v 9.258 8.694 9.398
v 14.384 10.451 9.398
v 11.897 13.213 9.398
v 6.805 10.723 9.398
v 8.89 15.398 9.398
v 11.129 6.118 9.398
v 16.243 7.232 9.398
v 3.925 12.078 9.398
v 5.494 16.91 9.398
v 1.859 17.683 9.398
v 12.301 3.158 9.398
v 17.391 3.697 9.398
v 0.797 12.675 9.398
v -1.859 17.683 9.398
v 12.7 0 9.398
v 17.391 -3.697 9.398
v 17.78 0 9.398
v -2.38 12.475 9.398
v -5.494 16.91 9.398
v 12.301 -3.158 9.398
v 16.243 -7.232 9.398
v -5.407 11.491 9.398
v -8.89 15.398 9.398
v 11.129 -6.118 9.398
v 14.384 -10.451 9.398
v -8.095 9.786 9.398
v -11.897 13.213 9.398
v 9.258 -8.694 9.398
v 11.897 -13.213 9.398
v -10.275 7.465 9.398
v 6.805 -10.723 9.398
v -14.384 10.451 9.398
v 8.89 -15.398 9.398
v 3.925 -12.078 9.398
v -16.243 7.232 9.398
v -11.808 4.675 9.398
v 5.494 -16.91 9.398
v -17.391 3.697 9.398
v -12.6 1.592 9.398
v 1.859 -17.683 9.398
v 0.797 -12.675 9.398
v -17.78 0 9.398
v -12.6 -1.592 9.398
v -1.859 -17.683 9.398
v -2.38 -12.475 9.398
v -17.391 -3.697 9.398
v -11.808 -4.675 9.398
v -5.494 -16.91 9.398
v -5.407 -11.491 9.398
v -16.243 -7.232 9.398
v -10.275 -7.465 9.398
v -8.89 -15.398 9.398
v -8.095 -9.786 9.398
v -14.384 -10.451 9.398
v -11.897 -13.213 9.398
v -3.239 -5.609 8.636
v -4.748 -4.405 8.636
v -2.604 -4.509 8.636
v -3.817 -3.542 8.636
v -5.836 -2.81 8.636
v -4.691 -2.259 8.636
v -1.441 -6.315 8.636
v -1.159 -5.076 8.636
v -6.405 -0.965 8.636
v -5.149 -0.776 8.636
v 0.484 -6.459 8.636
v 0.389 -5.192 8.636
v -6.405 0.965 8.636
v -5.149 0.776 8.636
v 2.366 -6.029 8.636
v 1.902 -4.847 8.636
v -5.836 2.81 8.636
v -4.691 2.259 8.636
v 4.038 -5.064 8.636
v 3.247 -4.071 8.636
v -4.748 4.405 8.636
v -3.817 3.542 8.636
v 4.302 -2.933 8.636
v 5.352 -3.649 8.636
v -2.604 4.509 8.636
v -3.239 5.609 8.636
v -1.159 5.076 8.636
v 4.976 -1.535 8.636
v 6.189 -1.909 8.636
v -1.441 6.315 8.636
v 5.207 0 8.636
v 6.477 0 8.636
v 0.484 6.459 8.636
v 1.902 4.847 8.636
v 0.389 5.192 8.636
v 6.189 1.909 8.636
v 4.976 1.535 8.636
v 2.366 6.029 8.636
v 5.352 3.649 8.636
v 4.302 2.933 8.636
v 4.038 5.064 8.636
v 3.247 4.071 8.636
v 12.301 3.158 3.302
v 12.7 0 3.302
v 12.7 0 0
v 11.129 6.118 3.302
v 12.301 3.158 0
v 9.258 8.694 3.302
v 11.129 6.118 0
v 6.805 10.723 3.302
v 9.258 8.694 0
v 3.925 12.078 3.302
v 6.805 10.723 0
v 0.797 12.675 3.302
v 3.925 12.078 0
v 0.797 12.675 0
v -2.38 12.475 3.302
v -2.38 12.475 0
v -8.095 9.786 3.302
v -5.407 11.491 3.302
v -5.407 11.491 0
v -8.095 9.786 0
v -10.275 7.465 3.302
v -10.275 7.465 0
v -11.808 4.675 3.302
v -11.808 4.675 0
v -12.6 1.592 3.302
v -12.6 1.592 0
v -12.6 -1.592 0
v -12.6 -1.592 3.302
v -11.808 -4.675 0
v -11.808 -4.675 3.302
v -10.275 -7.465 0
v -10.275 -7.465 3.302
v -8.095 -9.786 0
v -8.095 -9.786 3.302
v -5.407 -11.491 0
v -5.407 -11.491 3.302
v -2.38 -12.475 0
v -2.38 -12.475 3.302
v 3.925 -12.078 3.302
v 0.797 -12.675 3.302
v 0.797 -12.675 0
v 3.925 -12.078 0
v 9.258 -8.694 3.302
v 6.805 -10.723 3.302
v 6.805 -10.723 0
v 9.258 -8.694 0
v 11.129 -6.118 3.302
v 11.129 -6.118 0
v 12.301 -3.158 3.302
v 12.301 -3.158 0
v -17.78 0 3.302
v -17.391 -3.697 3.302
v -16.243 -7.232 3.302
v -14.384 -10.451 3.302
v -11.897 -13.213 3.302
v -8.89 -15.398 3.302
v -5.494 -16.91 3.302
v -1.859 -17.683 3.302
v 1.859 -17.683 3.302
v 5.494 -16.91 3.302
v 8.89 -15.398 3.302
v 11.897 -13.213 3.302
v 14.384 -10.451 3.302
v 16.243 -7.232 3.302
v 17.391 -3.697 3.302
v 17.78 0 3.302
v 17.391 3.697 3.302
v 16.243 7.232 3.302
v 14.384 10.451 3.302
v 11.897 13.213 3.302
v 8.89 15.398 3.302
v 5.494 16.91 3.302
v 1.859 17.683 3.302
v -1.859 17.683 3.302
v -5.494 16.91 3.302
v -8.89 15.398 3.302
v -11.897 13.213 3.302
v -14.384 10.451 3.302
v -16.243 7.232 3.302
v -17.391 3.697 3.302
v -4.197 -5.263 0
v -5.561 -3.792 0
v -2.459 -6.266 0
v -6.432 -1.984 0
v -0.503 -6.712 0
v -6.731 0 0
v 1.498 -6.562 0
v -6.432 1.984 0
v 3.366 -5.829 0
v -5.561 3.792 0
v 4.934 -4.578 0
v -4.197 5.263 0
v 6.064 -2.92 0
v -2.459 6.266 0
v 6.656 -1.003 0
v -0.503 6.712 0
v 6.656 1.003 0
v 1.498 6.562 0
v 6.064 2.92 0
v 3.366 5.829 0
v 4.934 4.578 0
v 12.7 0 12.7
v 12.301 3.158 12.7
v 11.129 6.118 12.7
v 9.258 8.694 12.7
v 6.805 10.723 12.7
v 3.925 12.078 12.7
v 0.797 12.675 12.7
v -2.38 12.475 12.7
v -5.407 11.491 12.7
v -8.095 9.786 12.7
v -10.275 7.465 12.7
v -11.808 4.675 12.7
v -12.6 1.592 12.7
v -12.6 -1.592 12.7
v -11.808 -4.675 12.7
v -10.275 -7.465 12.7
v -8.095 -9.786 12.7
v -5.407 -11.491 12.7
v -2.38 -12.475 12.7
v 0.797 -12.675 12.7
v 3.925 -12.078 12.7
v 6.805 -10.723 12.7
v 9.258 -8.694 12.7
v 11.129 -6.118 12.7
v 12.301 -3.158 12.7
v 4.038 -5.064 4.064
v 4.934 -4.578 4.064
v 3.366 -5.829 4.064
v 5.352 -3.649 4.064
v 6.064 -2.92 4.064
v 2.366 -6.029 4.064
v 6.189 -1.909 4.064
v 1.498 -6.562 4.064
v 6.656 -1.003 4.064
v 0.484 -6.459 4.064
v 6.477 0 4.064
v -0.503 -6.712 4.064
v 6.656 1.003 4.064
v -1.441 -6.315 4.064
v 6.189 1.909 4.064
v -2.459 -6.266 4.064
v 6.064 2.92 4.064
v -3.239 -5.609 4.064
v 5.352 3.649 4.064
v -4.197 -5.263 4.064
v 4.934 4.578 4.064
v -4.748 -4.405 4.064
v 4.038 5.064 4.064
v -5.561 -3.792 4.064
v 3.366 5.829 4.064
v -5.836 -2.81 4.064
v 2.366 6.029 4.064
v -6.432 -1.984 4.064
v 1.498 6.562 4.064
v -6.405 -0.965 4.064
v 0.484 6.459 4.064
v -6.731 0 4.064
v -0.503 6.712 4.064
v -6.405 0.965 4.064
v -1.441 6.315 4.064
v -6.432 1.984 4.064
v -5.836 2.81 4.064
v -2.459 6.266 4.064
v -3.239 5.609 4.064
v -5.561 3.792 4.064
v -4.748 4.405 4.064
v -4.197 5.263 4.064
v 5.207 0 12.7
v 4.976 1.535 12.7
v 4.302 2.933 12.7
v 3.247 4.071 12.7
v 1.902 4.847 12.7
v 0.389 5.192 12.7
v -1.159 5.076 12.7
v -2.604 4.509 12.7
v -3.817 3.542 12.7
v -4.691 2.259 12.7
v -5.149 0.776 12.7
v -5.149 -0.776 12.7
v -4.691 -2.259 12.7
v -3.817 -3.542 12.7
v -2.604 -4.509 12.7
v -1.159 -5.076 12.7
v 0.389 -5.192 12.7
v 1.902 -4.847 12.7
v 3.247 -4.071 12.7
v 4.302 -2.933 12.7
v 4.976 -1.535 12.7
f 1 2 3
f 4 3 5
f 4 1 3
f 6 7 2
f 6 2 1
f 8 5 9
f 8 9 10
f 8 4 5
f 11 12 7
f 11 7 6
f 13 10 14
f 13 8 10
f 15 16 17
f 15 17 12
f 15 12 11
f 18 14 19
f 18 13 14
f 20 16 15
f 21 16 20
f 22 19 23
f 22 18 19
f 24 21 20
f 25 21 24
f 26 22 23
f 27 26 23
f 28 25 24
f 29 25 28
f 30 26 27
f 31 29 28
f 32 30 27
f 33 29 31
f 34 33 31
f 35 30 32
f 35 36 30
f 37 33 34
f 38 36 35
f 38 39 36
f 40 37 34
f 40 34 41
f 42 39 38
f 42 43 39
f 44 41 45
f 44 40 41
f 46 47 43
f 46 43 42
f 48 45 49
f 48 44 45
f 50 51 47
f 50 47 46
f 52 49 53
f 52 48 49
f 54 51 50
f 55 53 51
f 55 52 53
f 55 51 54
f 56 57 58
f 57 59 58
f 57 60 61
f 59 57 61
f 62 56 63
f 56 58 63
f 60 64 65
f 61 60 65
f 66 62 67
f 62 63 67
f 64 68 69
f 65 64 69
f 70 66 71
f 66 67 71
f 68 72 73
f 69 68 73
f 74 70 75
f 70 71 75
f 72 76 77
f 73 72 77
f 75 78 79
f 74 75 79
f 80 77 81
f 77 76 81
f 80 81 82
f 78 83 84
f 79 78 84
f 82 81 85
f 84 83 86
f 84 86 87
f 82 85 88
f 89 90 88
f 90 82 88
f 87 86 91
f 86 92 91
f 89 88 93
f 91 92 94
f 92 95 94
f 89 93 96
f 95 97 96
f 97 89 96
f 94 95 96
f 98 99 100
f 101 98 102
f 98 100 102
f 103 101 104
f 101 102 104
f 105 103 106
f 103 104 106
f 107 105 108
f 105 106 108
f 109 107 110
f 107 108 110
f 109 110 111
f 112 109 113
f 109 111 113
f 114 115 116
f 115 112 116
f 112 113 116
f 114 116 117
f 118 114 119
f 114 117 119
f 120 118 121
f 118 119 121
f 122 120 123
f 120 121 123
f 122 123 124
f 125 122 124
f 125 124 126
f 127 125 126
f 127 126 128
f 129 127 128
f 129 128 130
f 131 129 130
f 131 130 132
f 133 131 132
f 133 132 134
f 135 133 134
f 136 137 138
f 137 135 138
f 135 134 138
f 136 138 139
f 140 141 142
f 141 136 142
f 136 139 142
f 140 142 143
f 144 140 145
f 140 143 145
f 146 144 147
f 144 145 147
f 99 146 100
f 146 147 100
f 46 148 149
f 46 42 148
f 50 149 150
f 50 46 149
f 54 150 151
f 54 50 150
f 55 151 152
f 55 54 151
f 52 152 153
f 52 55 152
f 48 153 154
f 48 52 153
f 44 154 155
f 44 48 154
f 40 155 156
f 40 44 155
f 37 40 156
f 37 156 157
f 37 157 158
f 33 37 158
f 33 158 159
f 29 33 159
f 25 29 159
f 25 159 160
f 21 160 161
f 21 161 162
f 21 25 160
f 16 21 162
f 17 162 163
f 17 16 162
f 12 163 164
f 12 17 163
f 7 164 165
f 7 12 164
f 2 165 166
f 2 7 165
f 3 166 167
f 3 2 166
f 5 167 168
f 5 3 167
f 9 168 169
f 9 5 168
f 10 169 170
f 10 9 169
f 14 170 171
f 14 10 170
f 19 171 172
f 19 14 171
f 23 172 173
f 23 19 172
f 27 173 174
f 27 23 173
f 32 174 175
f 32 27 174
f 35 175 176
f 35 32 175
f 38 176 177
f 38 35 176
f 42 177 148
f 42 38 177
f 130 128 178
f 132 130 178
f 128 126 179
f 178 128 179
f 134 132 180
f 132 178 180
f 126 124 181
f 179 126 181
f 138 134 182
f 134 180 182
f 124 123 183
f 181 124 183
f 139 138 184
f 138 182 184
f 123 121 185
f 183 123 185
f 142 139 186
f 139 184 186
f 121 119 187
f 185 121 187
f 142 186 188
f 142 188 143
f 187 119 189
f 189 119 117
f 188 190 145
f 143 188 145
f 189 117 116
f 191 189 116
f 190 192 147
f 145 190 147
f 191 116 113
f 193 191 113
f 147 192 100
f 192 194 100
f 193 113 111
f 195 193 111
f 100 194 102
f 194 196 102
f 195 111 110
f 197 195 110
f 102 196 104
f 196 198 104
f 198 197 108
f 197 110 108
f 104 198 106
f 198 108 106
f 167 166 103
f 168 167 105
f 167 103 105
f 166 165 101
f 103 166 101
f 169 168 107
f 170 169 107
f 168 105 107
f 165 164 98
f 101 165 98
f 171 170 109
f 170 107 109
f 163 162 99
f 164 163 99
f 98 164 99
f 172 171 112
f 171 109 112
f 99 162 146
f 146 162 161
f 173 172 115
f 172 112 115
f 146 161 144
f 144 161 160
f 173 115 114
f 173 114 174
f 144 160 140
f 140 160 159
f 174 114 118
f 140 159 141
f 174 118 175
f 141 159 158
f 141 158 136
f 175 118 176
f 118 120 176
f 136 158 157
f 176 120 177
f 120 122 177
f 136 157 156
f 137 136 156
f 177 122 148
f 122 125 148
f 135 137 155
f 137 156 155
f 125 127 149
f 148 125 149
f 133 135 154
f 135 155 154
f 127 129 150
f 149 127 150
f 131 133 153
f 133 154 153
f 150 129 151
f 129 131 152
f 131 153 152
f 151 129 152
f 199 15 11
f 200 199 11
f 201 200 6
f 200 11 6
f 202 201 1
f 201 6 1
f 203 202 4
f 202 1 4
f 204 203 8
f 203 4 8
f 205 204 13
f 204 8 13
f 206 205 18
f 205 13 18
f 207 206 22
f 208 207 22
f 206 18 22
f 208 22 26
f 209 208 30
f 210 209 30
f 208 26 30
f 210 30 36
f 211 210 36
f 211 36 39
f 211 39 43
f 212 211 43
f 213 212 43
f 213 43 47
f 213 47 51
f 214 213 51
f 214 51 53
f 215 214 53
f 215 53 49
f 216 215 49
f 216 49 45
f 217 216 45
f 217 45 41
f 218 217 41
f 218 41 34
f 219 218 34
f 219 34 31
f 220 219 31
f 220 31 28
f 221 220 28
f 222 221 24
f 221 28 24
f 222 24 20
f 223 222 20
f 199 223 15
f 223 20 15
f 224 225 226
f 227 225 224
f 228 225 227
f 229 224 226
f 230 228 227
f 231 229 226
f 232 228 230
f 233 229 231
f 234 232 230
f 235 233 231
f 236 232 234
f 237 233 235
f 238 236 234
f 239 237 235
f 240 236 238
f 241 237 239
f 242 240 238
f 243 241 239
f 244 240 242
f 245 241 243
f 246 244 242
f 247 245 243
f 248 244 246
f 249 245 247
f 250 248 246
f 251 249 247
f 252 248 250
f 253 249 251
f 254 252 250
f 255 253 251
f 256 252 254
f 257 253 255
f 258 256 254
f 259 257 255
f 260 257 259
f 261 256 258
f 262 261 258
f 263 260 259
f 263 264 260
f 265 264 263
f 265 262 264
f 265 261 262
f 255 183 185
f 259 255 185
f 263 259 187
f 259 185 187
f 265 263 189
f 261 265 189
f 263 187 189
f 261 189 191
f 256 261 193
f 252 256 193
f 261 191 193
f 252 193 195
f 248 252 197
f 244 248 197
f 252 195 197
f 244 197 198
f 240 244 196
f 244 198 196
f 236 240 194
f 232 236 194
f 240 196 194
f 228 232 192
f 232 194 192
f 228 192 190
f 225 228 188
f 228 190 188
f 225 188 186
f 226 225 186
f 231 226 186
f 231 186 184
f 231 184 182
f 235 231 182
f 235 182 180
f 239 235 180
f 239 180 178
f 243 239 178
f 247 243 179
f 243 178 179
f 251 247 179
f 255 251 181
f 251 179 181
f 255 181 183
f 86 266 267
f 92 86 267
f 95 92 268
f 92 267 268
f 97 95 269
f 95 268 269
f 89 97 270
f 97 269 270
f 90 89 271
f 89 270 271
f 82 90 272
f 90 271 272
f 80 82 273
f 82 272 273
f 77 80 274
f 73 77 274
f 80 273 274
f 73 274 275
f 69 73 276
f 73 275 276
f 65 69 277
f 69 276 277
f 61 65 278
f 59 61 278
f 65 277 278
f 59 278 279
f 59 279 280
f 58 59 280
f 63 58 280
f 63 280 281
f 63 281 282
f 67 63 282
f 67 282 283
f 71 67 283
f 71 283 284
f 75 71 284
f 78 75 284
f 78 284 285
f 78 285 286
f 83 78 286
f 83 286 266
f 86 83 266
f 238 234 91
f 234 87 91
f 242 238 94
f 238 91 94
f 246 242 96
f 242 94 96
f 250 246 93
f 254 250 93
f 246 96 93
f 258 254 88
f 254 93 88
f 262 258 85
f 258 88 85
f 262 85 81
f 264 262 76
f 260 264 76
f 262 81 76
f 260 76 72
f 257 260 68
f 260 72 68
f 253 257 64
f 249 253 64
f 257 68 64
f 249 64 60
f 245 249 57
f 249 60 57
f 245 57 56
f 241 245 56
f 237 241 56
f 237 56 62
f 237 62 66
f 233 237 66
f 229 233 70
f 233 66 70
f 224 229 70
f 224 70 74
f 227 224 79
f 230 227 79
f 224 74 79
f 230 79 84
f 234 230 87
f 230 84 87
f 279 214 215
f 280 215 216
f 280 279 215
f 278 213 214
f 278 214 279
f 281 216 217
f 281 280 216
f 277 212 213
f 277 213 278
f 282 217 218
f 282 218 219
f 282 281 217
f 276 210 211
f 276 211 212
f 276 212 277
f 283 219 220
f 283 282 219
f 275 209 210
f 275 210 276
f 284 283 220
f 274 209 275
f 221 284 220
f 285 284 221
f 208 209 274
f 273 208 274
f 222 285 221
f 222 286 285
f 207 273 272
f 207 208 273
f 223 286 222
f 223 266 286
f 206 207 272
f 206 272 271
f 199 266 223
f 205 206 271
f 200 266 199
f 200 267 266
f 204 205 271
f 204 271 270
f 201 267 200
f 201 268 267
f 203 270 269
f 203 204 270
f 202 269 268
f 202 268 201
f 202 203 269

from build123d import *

# Parameters (mm, degrees)
SKETCH1_R           = 12.7
BOSS_EXTRUDE1_DEPTH = 12.7
SKETCH2_R           = 17.78
BOSS_EXTRUDE2_DEPTH = 3.048
SKETCH9_R           = 6.477
CUT_EXTRUDE5_DEPTH  = 2.286
SKETCH10_R          = 6.731
CUT_EXTRUDE6_DEPTH  = 4.064
SKETCH11_R          = 5.207
CUT_EXTRUDE7_DEPTH  = 29.169962726


with BuildPart() as part:
    # Sketch1 → Boss-Extrude1 (new body)
    with BuildSketch(Plane.XY):
        Circle(SKETCH1_R)
    extrude(amount=BOSS_EXTRUDE1_DEPTH)

    # Sketch2 → Boss-Extrude2 (add, symmetric)
    with BuildSketch(Plane.XY.offset(6.35)):
        with Locations(Location((0, 0, 0), (0, 0, 180))):
            Circle(SKETCH2_R)
    extrude(amount=BOSS_EXTRUDE2_DEPTH, both=True)

    # Sketch9 → Cut-Extrude5 (cut, symmetric)
    with BuildSketch(Plane.XY.offset(6.35)):
        Circle(SKETCH9_R)
    extrude(amount=CUT_EXTRUDE5_DEPTH, both=True, mode=Mode.SUBTRACT)

    # Sketch10 → Cut-Extrude6 (cut)
    with BuildSketch(Plane(origin=(0, 0, 0), x_dir=(-1, 0, 0), z_dir=(0, 0, -1))):
        Circle(SKETCH10_R)
    extrude(amount=-CUT_EXTRUDE6_DEPTH, mode=Mode.SUBTRACT)

    # Sketch11 → Cut-Extrude7 (cut, through all)
    with BuildSketch(Plane.XY.offset(12.7)):
        Circle(SKETCH11_R)
    extrude(amount=-CUT_EXTRUDE7_DEPTH, mode=Mode.SUBTRACT)


solid = part.part
